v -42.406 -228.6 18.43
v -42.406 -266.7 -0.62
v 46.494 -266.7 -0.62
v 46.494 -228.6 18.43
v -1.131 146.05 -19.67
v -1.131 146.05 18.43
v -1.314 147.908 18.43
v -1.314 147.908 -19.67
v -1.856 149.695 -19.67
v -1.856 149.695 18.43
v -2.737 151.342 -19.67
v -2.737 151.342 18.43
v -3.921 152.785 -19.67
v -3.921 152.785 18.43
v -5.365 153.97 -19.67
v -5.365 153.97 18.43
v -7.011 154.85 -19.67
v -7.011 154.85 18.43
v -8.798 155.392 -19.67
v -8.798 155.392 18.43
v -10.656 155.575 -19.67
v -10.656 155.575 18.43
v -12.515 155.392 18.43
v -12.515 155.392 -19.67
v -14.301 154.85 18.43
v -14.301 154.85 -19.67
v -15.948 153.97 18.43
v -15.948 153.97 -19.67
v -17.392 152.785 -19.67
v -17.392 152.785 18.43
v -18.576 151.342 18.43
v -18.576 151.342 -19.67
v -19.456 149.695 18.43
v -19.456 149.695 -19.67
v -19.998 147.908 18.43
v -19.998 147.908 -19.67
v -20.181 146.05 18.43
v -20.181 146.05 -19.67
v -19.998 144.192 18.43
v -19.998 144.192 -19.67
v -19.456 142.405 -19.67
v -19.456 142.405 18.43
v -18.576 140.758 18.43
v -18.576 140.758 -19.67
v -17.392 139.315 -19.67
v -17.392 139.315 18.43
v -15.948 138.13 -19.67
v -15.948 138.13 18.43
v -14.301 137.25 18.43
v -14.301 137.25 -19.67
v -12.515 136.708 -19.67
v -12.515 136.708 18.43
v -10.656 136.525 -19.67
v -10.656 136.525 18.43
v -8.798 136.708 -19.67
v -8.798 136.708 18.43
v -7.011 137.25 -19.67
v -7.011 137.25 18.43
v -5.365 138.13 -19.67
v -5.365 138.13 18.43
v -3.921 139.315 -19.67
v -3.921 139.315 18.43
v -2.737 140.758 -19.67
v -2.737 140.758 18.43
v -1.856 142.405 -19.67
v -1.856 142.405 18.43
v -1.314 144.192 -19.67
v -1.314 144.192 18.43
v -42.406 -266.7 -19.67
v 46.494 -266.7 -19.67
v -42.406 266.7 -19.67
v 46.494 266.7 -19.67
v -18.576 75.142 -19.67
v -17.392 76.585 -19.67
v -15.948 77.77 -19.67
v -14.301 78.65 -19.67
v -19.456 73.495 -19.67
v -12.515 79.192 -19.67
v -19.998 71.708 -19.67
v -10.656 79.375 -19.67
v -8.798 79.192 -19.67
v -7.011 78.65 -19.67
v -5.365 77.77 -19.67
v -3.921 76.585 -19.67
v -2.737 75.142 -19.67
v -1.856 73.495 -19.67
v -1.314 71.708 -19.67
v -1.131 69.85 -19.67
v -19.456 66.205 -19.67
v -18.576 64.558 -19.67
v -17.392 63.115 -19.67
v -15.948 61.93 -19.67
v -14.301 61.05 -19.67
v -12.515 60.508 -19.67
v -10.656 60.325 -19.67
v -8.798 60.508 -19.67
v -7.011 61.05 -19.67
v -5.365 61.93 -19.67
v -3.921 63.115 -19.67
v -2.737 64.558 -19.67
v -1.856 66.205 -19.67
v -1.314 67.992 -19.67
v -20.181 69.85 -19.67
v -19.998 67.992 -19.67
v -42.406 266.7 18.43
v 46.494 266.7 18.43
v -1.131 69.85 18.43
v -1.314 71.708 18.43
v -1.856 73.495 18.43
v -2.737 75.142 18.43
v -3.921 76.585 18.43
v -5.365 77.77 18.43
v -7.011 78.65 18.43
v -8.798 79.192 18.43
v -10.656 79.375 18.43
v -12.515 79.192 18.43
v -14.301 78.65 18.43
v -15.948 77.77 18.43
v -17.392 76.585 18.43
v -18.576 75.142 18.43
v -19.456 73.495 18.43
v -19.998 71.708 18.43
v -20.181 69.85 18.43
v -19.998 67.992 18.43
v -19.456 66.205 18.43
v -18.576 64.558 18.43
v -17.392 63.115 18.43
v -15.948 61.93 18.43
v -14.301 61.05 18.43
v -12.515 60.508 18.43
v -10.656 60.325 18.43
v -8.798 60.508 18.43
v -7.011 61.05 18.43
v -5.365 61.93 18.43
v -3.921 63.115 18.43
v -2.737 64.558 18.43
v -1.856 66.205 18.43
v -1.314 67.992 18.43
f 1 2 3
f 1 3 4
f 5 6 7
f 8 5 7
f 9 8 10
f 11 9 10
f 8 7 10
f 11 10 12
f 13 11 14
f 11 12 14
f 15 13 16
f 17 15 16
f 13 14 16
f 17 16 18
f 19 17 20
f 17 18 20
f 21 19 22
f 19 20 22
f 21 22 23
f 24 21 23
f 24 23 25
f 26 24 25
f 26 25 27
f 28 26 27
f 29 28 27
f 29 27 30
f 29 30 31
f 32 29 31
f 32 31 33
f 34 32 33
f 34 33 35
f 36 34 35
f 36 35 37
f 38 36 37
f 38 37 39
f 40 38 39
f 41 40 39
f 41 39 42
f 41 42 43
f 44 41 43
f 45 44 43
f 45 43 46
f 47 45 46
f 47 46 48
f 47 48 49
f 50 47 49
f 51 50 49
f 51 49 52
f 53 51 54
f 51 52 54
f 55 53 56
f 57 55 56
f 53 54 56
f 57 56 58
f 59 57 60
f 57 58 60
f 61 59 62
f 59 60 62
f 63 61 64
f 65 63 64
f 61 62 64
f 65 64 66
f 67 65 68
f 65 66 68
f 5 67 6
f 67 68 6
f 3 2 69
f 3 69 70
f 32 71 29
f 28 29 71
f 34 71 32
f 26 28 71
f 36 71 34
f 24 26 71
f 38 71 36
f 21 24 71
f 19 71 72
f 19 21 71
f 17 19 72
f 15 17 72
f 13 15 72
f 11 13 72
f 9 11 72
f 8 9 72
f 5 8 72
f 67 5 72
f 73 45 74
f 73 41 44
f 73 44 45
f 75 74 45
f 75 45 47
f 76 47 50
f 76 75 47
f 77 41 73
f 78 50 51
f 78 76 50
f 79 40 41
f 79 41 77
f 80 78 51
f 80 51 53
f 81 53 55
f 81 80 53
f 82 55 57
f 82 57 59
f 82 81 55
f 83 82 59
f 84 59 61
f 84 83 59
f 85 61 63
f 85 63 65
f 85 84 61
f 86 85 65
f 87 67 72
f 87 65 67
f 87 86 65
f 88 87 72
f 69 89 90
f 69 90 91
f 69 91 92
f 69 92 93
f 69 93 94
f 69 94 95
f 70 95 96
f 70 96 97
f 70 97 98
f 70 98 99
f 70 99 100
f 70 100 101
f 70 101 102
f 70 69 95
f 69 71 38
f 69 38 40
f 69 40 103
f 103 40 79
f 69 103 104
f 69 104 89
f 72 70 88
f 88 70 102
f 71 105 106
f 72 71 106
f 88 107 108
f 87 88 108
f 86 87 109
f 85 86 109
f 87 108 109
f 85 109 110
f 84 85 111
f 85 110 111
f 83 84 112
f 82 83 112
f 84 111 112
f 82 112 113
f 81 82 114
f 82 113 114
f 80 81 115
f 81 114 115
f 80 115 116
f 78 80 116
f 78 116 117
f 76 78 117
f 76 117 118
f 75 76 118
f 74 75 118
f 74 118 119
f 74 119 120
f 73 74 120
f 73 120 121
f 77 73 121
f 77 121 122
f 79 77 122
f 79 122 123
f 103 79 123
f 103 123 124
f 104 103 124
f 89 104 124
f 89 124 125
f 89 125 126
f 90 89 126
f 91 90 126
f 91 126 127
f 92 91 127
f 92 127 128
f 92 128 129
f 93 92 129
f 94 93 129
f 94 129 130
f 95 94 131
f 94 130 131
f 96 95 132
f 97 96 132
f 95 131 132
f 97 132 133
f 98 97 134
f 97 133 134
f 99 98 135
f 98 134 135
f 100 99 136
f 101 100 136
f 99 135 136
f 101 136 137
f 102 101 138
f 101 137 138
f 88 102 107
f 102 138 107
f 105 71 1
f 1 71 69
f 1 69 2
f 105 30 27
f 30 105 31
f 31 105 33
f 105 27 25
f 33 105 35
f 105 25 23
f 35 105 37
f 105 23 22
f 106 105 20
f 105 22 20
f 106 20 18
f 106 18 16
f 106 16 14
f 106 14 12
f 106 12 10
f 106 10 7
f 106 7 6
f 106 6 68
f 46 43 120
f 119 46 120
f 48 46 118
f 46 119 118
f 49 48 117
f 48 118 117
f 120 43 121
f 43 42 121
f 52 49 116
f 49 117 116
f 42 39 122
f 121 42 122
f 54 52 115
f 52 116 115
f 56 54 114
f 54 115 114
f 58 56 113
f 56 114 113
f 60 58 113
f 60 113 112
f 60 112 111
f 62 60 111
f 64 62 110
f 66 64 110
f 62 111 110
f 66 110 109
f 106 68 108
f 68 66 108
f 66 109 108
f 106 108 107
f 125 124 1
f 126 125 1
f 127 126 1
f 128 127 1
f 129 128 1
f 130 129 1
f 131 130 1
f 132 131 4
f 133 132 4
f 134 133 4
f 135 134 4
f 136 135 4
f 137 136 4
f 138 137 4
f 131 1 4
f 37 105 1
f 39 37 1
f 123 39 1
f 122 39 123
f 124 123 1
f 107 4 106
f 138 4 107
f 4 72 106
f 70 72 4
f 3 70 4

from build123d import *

# Parameters (mm, degrees)
F0_W     = 88.9
F0_H     = 38.1
F1_DEPTH = 266.7
F3_DEPTH = 88.901
F4_R     = 9.525
F5_DEPTH = 38.101


with BuildPart() as f1:
    # F0 (on Front) → F1 (new body, symmetric)
    with BuildSketch(Plane.XZ):
        with Locations((2.043676, -0.6204)):
            Rectangle(F0_W, F0_H)
    extrude(amount=F1_DEPTH, both=True)

    # F2 (on face) → F3 (cut, through all)
    with BuildSketch(Plane.YZ.offset(46.493676)):
        Polygon((-266.7, -0.6204), (-228.6, 18.4296), (-266.7, 18.4296), align=None)
    extrude(amount=-F3_DEPTH, mode=Mode.SUBTRACT)

    # F4 (on face) → F5 (cut, through all)
    with BuildSketch(Plane.XY.offset(18.4296)):
        with Locations((-10.656324, 146.05)):
            Circle(F4_R)
        with Locations((-10.656324, 69.85)):
            Circle(F4_R)
    extrude(amount=-F5_DEPTH, mode=Mode.SUBTRACT)


solid = f1.part
